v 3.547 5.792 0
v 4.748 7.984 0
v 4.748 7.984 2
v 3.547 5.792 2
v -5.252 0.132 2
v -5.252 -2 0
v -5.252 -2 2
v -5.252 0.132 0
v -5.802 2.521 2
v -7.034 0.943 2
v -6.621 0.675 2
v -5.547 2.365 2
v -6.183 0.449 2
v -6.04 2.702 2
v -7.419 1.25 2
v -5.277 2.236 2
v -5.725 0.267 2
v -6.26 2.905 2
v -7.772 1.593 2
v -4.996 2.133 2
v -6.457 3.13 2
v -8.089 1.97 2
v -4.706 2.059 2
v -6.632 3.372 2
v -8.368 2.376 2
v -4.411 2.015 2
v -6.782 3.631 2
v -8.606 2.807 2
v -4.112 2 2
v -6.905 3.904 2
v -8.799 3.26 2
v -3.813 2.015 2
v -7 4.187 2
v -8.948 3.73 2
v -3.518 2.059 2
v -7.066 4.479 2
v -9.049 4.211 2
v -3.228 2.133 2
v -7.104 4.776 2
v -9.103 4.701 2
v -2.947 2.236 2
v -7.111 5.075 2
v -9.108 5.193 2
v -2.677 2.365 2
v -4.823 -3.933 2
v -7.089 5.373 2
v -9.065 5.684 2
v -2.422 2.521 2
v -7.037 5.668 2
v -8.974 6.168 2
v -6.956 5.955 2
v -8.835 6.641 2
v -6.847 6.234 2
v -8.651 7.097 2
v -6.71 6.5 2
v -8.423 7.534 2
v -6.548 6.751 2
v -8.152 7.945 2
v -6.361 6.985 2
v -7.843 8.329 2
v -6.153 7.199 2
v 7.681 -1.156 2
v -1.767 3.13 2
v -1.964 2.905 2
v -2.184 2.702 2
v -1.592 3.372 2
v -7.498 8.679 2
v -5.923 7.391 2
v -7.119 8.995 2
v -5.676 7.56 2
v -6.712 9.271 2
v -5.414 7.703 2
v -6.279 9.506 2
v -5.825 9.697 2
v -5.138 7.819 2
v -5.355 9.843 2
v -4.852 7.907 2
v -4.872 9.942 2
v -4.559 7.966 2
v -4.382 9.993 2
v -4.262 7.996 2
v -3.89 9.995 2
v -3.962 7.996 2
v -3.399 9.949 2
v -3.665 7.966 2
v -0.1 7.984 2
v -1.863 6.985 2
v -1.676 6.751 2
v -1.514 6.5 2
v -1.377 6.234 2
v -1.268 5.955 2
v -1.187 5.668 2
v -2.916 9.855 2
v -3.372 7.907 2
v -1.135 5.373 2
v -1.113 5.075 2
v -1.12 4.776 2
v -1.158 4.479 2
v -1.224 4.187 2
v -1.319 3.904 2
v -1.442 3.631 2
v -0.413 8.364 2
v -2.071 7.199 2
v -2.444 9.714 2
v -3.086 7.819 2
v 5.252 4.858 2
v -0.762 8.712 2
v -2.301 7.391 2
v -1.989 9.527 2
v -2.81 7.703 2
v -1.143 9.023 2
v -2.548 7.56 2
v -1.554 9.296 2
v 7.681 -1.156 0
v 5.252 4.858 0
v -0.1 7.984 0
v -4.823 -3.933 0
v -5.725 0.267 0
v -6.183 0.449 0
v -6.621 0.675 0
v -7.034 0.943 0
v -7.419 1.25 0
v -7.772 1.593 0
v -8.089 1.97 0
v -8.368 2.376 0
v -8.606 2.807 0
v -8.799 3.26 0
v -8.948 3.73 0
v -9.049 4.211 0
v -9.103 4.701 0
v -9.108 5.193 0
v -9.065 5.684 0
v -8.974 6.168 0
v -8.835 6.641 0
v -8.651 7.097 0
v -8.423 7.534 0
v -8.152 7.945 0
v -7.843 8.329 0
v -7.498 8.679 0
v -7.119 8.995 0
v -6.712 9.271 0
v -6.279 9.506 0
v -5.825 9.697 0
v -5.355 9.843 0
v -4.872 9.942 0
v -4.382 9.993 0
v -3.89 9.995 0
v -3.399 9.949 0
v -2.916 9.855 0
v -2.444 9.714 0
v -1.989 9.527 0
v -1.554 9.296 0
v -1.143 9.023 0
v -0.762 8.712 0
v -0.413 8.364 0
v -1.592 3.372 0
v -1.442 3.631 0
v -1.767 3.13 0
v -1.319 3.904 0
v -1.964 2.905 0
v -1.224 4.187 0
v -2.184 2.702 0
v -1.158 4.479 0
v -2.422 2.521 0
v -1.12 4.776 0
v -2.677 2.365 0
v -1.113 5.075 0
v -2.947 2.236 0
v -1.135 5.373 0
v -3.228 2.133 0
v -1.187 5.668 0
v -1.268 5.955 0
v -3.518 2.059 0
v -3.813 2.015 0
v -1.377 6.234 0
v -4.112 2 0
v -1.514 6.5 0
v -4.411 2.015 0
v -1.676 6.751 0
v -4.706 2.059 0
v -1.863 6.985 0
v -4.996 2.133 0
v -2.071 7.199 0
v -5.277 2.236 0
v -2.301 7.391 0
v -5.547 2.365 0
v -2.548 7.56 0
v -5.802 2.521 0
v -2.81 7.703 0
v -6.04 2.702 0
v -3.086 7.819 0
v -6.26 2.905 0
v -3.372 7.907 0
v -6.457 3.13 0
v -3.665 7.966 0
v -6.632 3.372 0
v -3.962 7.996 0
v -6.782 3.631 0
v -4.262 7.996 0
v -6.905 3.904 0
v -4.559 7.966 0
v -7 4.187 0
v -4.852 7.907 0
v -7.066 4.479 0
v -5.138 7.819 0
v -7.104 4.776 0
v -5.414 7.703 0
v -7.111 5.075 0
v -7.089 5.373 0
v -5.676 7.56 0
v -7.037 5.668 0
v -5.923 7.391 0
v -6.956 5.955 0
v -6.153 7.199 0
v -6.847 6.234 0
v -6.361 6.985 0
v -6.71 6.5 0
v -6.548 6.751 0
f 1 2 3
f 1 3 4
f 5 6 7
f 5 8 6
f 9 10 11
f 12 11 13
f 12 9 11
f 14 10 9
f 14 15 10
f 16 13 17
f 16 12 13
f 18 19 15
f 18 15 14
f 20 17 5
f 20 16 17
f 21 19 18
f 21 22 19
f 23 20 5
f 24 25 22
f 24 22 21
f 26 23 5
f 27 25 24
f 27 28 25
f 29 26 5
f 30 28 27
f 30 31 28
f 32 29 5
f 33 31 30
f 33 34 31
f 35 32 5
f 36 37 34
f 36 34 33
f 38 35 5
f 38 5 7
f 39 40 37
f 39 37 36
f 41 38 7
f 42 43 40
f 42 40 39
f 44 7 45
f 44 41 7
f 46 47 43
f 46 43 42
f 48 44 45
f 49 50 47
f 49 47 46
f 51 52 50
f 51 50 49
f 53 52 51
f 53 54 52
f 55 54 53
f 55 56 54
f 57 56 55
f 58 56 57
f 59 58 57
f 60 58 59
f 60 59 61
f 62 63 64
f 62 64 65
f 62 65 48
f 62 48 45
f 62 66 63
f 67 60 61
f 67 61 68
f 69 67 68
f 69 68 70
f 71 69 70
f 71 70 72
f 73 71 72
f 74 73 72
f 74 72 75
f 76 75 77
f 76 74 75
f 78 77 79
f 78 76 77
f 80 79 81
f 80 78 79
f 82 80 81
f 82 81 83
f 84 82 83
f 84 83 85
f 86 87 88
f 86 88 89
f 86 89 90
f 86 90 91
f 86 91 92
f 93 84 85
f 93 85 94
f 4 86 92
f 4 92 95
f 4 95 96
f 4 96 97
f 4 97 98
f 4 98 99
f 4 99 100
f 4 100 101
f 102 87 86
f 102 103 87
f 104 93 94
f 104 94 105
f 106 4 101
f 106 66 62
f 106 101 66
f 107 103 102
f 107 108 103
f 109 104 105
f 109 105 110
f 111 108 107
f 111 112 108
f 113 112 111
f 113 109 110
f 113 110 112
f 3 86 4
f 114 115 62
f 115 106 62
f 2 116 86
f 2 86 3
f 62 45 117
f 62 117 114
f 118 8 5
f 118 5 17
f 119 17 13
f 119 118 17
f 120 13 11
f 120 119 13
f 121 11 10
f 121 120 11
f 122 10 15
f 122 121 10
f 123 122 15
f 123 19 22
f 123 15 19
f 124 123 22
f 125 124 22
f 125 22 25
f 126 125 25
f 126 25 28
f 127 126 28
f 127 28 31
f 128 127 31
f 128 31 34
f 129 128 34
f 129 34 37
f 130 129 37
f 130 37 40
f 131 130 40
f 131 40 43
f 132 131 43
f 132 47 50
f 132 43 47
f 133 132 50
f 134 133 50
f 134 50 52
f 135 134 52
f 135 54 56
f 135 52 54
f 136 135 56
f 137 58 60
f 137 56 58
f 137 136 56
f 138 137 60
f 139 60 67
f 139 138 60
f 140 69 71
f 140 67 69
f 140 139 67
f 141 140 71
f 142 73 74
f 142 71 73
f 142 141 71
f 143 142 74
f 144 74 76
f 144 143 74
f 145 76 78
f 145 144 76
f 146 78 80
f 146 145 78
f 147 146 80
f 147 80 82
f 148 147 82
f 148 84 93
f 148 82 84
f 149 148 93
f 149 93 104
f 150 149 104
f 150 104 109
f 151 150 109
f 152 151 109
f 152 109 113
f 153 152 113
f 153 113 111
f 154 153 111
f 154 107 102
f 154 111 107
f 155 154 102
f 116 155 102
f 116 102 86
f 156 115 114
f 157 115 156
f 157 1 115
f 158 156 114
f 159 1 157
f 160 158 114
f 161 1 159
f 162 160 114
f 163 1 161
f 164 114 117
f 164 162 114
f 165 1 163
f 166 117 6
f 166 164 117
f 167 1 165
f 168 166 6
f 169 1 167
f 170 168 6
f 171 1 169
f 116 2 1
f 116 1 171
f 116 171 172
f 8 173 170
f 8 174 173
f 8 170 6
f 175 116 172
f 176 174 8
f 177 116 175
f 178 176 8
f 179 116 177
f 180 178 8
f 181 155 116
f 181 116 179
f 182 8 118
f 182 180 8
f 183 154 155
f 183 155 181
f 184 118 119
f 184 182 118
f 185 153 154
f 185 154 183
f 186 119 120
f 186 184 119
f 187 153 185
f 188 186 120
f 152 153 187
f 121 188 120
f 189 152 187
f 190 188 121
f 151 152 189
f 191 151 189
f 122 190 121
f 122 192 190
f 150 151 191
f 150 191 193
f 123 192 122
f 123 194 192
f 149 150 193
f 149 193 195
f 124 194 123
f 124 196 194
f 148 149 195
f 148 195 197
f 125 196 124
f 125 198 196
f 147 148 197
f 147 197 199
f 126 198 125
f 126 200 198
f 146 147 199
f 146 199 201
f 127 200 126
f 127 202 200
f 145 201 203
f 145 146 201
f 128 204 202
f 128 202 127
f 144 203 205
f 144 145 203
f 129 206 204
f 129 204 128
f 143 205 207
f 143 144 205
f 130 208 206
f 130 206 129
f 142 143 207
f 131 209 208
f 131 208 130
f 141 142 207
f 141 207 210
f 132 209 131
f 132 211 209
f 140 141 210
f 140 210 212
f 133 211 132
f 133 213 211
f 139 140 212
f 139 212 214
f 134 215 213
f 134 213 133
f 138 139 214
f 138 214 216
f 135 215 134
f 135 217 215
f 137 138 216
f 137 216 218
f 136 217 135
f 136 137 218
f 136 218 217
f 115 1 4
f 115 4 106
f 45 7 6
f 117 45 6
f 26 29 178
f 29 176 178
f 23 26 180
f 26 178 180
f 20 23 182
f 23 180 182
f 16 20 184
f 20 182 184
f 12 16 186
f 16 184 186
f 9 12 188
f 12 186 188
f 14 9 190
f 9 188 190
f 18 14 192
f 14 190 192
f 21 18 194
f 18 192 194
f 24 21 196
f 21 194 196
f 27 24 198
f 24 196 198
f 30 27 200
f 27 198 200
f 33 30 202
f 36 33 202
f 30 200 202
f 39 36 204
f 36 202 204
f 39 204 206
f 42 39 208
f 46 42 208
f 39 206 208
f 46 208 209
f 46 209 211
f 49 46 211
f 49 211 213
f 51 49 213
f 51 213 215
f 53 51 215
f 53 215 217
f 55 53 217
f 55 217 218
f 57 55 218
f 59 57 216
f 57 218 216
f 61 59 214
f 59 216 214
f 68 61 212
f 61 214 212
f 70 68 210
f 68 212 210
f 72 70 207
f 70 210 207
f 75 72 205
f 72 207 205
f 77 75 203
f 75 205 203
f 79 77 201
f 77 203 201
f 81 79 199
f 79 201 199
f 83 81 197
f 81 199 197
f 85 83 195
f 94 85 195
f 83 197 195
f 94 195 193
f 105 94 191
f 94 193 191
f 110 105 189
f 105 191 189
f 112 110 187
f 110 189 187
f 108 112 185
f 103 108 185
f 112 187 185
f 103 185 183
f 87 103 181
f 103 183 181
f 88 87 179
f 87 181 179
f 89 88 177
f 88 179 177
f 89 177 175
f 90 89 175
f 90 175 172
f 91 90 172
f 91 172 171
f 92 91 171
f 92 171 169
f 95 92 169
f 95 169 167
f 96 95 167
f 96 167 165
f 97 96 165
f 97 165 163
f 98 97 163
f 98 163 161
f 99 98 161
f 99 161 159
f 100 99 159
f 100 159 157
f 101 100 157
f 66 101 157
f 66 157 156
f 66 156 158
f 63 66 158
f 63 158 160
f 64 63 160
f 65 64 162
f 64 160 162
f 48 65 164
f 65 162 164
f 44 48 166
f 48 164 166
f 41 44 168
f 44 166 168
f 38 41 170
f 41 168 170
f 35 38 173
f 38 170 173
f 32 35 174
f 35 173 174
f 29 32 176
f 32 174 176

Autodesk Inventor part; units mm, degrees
ref_plane "YZ Plane" through (0, 0, 0) normal (1, 0, 0) x (0, 1, 0)
ref_plane "XZ Plane" through (0, 0, 0) normal (0, 1, 0) x (-1, 0, 0)
ref_plane "XY Plane" through (0, 0, 0) normal (0, 0, 1) x (1, 0, 0)
sketch "Skizze1" plane through (0, 0, 0) normal (0, 0, 1) x (1, 0, 0)
  line L0 (-0.1001, 7.9841) -> (4.7481, 7.9841)
  line L1 (5.2519, 4.8576) -> (5.2519, 0)
  line L2 (5.2519, 0) -> (-5.2519, 0)
  line L3 (-5.2519, 0) -> (-5.2519, 0.1317)
  line L4 (0, 14.3325) -> (0, -2.5319) projected
  line L5 (-14.2928, 0) -> (8.5093, 0) projected
  line L6 (4.7481, 7.9841) -> (3.547, 5.7916)
  line L7 (3.547, 5.7916) -> (5.2519, 4.8576)
  arc A0 (-0.1001, 7.9841) -> (-5.2519, 0.1317) centre (-4.112, 5) ccw
  point P0 (0, 0)
  dimension "d34" = 8
  dimension "d36" = 2.5
  dimension "d40" = 10
  dimension "d41" = 61.286
  dimension "d42" = 5.2519
  dimension "d43" = 7.9841
  dimension "d44" = 0.1002
extrude "Extrusion2" add sketch "Skizze1" along normal blind 2
sketch "Skizze4" plane through (0, 0, 2) normal (0, 0, 1) x (1, 0, 0)
  arc A0 (-0.1001, 7.9841) -> (-5.2519, 0.1317) centre (-4.112, 5) ccw projected
  point P0 (0, 0)
hole "Bohrung2" at (-4.112, 5, 2) direction (0, 0, -1) diameter 6 end through all
sketch "Skizze5" plane through (-5.2519, 0, 0) normal (0, -1, 0) x (1, 0, 0)
  line L0 (0, 0) -> (10.5038, 0) projected
  line L1 (10.5038, 0) -> (10.5038, 2) projected
  line L2 (0, 2) -> (10.5038, 2) projected
  line L3 (0, 0) -> (0, 2) projected
  point P0 (5.2519, 0)
extrude "Extrusion3" add sketch "Skizze5" along normal blind 2
sketch "Skizze6" plane through (5.2519, 4.8576, 2) normal (1, 0, 0) x (0, 0, -1)
  line L0 (2, 0) -> (2, -6.8576) projected
  line L1 (2, 0) -> (0, 0) projected
  line L2 (0, 0) -> (0, -6.8576) projected
  line L3 (2, -6.8576) -> (0, -6.8576) projected
  point P0 (2, -4.8576)
extrude "Extrusion4" add sketch "Skizze6" along normal blind 2
sketch "Skizze7" plane through (0, 0, 2) normal (0, 0, 1) x (1, 0, 0)
  line L0 (-5.2519, -2) -> (7.2519, -2) projected
  line L1 (7.2519, 4.8576) -> (7.2519, -2) projected
  line L2 (-5.2519, -2) -> (7.2519, 0.7766)
  line L3 (-5.2519, -2) -> (7.5565, -2) construction
  point P0 (0, 0)
  dimension "d56" = 12.52
extrude "Extrusion5" cut sketch "Skizze7" against normal blind 2
sketch "Skizze8" plane through (-5.2519, -2, 0) normal (0.2168, -0.9762, 0) x (0.9762, 0.2168, 0)
  line L0 (0, 2) -> (12.8083, 2) projected
  line L1 (0, 2) -> (0, 0) projected
  line L2 (12.8083, 0) -> (0, 0) projected
  line L3 (12.8083, 2) -> (12.8083, 0) projected
  point P0 (5.5605, 0)
extrude "Extrusion6" add sketch "Skizze8" along normal blind 1.98
sketch "Skizze9" plane through (0, 0, 2) normal (0, 0, 1) x (1, 0, 0)
  line L0 (7.2519, 4.8576) -> (7.2519, 0.7766) projected
  line L1 (5.2519, 4.8576) -> (7.2519, 4.8576) projected
  line L2 (7.6811, -1.1563) -> (-4.8227, -3.9329) projected
  line L3 (7.2519, 0.7766) -> (7.6811, -1.1563) projected
  line L4 (5.2519, 4.8576) -> (7.6811, -1.1563)
  point P0 (0, 0)
extrude "Extrusion7" cut sketch "Skizze9" against normal blind 2
properties part number "Kontakt" material "2.0265 CuZn30(Bronze/weich)"
